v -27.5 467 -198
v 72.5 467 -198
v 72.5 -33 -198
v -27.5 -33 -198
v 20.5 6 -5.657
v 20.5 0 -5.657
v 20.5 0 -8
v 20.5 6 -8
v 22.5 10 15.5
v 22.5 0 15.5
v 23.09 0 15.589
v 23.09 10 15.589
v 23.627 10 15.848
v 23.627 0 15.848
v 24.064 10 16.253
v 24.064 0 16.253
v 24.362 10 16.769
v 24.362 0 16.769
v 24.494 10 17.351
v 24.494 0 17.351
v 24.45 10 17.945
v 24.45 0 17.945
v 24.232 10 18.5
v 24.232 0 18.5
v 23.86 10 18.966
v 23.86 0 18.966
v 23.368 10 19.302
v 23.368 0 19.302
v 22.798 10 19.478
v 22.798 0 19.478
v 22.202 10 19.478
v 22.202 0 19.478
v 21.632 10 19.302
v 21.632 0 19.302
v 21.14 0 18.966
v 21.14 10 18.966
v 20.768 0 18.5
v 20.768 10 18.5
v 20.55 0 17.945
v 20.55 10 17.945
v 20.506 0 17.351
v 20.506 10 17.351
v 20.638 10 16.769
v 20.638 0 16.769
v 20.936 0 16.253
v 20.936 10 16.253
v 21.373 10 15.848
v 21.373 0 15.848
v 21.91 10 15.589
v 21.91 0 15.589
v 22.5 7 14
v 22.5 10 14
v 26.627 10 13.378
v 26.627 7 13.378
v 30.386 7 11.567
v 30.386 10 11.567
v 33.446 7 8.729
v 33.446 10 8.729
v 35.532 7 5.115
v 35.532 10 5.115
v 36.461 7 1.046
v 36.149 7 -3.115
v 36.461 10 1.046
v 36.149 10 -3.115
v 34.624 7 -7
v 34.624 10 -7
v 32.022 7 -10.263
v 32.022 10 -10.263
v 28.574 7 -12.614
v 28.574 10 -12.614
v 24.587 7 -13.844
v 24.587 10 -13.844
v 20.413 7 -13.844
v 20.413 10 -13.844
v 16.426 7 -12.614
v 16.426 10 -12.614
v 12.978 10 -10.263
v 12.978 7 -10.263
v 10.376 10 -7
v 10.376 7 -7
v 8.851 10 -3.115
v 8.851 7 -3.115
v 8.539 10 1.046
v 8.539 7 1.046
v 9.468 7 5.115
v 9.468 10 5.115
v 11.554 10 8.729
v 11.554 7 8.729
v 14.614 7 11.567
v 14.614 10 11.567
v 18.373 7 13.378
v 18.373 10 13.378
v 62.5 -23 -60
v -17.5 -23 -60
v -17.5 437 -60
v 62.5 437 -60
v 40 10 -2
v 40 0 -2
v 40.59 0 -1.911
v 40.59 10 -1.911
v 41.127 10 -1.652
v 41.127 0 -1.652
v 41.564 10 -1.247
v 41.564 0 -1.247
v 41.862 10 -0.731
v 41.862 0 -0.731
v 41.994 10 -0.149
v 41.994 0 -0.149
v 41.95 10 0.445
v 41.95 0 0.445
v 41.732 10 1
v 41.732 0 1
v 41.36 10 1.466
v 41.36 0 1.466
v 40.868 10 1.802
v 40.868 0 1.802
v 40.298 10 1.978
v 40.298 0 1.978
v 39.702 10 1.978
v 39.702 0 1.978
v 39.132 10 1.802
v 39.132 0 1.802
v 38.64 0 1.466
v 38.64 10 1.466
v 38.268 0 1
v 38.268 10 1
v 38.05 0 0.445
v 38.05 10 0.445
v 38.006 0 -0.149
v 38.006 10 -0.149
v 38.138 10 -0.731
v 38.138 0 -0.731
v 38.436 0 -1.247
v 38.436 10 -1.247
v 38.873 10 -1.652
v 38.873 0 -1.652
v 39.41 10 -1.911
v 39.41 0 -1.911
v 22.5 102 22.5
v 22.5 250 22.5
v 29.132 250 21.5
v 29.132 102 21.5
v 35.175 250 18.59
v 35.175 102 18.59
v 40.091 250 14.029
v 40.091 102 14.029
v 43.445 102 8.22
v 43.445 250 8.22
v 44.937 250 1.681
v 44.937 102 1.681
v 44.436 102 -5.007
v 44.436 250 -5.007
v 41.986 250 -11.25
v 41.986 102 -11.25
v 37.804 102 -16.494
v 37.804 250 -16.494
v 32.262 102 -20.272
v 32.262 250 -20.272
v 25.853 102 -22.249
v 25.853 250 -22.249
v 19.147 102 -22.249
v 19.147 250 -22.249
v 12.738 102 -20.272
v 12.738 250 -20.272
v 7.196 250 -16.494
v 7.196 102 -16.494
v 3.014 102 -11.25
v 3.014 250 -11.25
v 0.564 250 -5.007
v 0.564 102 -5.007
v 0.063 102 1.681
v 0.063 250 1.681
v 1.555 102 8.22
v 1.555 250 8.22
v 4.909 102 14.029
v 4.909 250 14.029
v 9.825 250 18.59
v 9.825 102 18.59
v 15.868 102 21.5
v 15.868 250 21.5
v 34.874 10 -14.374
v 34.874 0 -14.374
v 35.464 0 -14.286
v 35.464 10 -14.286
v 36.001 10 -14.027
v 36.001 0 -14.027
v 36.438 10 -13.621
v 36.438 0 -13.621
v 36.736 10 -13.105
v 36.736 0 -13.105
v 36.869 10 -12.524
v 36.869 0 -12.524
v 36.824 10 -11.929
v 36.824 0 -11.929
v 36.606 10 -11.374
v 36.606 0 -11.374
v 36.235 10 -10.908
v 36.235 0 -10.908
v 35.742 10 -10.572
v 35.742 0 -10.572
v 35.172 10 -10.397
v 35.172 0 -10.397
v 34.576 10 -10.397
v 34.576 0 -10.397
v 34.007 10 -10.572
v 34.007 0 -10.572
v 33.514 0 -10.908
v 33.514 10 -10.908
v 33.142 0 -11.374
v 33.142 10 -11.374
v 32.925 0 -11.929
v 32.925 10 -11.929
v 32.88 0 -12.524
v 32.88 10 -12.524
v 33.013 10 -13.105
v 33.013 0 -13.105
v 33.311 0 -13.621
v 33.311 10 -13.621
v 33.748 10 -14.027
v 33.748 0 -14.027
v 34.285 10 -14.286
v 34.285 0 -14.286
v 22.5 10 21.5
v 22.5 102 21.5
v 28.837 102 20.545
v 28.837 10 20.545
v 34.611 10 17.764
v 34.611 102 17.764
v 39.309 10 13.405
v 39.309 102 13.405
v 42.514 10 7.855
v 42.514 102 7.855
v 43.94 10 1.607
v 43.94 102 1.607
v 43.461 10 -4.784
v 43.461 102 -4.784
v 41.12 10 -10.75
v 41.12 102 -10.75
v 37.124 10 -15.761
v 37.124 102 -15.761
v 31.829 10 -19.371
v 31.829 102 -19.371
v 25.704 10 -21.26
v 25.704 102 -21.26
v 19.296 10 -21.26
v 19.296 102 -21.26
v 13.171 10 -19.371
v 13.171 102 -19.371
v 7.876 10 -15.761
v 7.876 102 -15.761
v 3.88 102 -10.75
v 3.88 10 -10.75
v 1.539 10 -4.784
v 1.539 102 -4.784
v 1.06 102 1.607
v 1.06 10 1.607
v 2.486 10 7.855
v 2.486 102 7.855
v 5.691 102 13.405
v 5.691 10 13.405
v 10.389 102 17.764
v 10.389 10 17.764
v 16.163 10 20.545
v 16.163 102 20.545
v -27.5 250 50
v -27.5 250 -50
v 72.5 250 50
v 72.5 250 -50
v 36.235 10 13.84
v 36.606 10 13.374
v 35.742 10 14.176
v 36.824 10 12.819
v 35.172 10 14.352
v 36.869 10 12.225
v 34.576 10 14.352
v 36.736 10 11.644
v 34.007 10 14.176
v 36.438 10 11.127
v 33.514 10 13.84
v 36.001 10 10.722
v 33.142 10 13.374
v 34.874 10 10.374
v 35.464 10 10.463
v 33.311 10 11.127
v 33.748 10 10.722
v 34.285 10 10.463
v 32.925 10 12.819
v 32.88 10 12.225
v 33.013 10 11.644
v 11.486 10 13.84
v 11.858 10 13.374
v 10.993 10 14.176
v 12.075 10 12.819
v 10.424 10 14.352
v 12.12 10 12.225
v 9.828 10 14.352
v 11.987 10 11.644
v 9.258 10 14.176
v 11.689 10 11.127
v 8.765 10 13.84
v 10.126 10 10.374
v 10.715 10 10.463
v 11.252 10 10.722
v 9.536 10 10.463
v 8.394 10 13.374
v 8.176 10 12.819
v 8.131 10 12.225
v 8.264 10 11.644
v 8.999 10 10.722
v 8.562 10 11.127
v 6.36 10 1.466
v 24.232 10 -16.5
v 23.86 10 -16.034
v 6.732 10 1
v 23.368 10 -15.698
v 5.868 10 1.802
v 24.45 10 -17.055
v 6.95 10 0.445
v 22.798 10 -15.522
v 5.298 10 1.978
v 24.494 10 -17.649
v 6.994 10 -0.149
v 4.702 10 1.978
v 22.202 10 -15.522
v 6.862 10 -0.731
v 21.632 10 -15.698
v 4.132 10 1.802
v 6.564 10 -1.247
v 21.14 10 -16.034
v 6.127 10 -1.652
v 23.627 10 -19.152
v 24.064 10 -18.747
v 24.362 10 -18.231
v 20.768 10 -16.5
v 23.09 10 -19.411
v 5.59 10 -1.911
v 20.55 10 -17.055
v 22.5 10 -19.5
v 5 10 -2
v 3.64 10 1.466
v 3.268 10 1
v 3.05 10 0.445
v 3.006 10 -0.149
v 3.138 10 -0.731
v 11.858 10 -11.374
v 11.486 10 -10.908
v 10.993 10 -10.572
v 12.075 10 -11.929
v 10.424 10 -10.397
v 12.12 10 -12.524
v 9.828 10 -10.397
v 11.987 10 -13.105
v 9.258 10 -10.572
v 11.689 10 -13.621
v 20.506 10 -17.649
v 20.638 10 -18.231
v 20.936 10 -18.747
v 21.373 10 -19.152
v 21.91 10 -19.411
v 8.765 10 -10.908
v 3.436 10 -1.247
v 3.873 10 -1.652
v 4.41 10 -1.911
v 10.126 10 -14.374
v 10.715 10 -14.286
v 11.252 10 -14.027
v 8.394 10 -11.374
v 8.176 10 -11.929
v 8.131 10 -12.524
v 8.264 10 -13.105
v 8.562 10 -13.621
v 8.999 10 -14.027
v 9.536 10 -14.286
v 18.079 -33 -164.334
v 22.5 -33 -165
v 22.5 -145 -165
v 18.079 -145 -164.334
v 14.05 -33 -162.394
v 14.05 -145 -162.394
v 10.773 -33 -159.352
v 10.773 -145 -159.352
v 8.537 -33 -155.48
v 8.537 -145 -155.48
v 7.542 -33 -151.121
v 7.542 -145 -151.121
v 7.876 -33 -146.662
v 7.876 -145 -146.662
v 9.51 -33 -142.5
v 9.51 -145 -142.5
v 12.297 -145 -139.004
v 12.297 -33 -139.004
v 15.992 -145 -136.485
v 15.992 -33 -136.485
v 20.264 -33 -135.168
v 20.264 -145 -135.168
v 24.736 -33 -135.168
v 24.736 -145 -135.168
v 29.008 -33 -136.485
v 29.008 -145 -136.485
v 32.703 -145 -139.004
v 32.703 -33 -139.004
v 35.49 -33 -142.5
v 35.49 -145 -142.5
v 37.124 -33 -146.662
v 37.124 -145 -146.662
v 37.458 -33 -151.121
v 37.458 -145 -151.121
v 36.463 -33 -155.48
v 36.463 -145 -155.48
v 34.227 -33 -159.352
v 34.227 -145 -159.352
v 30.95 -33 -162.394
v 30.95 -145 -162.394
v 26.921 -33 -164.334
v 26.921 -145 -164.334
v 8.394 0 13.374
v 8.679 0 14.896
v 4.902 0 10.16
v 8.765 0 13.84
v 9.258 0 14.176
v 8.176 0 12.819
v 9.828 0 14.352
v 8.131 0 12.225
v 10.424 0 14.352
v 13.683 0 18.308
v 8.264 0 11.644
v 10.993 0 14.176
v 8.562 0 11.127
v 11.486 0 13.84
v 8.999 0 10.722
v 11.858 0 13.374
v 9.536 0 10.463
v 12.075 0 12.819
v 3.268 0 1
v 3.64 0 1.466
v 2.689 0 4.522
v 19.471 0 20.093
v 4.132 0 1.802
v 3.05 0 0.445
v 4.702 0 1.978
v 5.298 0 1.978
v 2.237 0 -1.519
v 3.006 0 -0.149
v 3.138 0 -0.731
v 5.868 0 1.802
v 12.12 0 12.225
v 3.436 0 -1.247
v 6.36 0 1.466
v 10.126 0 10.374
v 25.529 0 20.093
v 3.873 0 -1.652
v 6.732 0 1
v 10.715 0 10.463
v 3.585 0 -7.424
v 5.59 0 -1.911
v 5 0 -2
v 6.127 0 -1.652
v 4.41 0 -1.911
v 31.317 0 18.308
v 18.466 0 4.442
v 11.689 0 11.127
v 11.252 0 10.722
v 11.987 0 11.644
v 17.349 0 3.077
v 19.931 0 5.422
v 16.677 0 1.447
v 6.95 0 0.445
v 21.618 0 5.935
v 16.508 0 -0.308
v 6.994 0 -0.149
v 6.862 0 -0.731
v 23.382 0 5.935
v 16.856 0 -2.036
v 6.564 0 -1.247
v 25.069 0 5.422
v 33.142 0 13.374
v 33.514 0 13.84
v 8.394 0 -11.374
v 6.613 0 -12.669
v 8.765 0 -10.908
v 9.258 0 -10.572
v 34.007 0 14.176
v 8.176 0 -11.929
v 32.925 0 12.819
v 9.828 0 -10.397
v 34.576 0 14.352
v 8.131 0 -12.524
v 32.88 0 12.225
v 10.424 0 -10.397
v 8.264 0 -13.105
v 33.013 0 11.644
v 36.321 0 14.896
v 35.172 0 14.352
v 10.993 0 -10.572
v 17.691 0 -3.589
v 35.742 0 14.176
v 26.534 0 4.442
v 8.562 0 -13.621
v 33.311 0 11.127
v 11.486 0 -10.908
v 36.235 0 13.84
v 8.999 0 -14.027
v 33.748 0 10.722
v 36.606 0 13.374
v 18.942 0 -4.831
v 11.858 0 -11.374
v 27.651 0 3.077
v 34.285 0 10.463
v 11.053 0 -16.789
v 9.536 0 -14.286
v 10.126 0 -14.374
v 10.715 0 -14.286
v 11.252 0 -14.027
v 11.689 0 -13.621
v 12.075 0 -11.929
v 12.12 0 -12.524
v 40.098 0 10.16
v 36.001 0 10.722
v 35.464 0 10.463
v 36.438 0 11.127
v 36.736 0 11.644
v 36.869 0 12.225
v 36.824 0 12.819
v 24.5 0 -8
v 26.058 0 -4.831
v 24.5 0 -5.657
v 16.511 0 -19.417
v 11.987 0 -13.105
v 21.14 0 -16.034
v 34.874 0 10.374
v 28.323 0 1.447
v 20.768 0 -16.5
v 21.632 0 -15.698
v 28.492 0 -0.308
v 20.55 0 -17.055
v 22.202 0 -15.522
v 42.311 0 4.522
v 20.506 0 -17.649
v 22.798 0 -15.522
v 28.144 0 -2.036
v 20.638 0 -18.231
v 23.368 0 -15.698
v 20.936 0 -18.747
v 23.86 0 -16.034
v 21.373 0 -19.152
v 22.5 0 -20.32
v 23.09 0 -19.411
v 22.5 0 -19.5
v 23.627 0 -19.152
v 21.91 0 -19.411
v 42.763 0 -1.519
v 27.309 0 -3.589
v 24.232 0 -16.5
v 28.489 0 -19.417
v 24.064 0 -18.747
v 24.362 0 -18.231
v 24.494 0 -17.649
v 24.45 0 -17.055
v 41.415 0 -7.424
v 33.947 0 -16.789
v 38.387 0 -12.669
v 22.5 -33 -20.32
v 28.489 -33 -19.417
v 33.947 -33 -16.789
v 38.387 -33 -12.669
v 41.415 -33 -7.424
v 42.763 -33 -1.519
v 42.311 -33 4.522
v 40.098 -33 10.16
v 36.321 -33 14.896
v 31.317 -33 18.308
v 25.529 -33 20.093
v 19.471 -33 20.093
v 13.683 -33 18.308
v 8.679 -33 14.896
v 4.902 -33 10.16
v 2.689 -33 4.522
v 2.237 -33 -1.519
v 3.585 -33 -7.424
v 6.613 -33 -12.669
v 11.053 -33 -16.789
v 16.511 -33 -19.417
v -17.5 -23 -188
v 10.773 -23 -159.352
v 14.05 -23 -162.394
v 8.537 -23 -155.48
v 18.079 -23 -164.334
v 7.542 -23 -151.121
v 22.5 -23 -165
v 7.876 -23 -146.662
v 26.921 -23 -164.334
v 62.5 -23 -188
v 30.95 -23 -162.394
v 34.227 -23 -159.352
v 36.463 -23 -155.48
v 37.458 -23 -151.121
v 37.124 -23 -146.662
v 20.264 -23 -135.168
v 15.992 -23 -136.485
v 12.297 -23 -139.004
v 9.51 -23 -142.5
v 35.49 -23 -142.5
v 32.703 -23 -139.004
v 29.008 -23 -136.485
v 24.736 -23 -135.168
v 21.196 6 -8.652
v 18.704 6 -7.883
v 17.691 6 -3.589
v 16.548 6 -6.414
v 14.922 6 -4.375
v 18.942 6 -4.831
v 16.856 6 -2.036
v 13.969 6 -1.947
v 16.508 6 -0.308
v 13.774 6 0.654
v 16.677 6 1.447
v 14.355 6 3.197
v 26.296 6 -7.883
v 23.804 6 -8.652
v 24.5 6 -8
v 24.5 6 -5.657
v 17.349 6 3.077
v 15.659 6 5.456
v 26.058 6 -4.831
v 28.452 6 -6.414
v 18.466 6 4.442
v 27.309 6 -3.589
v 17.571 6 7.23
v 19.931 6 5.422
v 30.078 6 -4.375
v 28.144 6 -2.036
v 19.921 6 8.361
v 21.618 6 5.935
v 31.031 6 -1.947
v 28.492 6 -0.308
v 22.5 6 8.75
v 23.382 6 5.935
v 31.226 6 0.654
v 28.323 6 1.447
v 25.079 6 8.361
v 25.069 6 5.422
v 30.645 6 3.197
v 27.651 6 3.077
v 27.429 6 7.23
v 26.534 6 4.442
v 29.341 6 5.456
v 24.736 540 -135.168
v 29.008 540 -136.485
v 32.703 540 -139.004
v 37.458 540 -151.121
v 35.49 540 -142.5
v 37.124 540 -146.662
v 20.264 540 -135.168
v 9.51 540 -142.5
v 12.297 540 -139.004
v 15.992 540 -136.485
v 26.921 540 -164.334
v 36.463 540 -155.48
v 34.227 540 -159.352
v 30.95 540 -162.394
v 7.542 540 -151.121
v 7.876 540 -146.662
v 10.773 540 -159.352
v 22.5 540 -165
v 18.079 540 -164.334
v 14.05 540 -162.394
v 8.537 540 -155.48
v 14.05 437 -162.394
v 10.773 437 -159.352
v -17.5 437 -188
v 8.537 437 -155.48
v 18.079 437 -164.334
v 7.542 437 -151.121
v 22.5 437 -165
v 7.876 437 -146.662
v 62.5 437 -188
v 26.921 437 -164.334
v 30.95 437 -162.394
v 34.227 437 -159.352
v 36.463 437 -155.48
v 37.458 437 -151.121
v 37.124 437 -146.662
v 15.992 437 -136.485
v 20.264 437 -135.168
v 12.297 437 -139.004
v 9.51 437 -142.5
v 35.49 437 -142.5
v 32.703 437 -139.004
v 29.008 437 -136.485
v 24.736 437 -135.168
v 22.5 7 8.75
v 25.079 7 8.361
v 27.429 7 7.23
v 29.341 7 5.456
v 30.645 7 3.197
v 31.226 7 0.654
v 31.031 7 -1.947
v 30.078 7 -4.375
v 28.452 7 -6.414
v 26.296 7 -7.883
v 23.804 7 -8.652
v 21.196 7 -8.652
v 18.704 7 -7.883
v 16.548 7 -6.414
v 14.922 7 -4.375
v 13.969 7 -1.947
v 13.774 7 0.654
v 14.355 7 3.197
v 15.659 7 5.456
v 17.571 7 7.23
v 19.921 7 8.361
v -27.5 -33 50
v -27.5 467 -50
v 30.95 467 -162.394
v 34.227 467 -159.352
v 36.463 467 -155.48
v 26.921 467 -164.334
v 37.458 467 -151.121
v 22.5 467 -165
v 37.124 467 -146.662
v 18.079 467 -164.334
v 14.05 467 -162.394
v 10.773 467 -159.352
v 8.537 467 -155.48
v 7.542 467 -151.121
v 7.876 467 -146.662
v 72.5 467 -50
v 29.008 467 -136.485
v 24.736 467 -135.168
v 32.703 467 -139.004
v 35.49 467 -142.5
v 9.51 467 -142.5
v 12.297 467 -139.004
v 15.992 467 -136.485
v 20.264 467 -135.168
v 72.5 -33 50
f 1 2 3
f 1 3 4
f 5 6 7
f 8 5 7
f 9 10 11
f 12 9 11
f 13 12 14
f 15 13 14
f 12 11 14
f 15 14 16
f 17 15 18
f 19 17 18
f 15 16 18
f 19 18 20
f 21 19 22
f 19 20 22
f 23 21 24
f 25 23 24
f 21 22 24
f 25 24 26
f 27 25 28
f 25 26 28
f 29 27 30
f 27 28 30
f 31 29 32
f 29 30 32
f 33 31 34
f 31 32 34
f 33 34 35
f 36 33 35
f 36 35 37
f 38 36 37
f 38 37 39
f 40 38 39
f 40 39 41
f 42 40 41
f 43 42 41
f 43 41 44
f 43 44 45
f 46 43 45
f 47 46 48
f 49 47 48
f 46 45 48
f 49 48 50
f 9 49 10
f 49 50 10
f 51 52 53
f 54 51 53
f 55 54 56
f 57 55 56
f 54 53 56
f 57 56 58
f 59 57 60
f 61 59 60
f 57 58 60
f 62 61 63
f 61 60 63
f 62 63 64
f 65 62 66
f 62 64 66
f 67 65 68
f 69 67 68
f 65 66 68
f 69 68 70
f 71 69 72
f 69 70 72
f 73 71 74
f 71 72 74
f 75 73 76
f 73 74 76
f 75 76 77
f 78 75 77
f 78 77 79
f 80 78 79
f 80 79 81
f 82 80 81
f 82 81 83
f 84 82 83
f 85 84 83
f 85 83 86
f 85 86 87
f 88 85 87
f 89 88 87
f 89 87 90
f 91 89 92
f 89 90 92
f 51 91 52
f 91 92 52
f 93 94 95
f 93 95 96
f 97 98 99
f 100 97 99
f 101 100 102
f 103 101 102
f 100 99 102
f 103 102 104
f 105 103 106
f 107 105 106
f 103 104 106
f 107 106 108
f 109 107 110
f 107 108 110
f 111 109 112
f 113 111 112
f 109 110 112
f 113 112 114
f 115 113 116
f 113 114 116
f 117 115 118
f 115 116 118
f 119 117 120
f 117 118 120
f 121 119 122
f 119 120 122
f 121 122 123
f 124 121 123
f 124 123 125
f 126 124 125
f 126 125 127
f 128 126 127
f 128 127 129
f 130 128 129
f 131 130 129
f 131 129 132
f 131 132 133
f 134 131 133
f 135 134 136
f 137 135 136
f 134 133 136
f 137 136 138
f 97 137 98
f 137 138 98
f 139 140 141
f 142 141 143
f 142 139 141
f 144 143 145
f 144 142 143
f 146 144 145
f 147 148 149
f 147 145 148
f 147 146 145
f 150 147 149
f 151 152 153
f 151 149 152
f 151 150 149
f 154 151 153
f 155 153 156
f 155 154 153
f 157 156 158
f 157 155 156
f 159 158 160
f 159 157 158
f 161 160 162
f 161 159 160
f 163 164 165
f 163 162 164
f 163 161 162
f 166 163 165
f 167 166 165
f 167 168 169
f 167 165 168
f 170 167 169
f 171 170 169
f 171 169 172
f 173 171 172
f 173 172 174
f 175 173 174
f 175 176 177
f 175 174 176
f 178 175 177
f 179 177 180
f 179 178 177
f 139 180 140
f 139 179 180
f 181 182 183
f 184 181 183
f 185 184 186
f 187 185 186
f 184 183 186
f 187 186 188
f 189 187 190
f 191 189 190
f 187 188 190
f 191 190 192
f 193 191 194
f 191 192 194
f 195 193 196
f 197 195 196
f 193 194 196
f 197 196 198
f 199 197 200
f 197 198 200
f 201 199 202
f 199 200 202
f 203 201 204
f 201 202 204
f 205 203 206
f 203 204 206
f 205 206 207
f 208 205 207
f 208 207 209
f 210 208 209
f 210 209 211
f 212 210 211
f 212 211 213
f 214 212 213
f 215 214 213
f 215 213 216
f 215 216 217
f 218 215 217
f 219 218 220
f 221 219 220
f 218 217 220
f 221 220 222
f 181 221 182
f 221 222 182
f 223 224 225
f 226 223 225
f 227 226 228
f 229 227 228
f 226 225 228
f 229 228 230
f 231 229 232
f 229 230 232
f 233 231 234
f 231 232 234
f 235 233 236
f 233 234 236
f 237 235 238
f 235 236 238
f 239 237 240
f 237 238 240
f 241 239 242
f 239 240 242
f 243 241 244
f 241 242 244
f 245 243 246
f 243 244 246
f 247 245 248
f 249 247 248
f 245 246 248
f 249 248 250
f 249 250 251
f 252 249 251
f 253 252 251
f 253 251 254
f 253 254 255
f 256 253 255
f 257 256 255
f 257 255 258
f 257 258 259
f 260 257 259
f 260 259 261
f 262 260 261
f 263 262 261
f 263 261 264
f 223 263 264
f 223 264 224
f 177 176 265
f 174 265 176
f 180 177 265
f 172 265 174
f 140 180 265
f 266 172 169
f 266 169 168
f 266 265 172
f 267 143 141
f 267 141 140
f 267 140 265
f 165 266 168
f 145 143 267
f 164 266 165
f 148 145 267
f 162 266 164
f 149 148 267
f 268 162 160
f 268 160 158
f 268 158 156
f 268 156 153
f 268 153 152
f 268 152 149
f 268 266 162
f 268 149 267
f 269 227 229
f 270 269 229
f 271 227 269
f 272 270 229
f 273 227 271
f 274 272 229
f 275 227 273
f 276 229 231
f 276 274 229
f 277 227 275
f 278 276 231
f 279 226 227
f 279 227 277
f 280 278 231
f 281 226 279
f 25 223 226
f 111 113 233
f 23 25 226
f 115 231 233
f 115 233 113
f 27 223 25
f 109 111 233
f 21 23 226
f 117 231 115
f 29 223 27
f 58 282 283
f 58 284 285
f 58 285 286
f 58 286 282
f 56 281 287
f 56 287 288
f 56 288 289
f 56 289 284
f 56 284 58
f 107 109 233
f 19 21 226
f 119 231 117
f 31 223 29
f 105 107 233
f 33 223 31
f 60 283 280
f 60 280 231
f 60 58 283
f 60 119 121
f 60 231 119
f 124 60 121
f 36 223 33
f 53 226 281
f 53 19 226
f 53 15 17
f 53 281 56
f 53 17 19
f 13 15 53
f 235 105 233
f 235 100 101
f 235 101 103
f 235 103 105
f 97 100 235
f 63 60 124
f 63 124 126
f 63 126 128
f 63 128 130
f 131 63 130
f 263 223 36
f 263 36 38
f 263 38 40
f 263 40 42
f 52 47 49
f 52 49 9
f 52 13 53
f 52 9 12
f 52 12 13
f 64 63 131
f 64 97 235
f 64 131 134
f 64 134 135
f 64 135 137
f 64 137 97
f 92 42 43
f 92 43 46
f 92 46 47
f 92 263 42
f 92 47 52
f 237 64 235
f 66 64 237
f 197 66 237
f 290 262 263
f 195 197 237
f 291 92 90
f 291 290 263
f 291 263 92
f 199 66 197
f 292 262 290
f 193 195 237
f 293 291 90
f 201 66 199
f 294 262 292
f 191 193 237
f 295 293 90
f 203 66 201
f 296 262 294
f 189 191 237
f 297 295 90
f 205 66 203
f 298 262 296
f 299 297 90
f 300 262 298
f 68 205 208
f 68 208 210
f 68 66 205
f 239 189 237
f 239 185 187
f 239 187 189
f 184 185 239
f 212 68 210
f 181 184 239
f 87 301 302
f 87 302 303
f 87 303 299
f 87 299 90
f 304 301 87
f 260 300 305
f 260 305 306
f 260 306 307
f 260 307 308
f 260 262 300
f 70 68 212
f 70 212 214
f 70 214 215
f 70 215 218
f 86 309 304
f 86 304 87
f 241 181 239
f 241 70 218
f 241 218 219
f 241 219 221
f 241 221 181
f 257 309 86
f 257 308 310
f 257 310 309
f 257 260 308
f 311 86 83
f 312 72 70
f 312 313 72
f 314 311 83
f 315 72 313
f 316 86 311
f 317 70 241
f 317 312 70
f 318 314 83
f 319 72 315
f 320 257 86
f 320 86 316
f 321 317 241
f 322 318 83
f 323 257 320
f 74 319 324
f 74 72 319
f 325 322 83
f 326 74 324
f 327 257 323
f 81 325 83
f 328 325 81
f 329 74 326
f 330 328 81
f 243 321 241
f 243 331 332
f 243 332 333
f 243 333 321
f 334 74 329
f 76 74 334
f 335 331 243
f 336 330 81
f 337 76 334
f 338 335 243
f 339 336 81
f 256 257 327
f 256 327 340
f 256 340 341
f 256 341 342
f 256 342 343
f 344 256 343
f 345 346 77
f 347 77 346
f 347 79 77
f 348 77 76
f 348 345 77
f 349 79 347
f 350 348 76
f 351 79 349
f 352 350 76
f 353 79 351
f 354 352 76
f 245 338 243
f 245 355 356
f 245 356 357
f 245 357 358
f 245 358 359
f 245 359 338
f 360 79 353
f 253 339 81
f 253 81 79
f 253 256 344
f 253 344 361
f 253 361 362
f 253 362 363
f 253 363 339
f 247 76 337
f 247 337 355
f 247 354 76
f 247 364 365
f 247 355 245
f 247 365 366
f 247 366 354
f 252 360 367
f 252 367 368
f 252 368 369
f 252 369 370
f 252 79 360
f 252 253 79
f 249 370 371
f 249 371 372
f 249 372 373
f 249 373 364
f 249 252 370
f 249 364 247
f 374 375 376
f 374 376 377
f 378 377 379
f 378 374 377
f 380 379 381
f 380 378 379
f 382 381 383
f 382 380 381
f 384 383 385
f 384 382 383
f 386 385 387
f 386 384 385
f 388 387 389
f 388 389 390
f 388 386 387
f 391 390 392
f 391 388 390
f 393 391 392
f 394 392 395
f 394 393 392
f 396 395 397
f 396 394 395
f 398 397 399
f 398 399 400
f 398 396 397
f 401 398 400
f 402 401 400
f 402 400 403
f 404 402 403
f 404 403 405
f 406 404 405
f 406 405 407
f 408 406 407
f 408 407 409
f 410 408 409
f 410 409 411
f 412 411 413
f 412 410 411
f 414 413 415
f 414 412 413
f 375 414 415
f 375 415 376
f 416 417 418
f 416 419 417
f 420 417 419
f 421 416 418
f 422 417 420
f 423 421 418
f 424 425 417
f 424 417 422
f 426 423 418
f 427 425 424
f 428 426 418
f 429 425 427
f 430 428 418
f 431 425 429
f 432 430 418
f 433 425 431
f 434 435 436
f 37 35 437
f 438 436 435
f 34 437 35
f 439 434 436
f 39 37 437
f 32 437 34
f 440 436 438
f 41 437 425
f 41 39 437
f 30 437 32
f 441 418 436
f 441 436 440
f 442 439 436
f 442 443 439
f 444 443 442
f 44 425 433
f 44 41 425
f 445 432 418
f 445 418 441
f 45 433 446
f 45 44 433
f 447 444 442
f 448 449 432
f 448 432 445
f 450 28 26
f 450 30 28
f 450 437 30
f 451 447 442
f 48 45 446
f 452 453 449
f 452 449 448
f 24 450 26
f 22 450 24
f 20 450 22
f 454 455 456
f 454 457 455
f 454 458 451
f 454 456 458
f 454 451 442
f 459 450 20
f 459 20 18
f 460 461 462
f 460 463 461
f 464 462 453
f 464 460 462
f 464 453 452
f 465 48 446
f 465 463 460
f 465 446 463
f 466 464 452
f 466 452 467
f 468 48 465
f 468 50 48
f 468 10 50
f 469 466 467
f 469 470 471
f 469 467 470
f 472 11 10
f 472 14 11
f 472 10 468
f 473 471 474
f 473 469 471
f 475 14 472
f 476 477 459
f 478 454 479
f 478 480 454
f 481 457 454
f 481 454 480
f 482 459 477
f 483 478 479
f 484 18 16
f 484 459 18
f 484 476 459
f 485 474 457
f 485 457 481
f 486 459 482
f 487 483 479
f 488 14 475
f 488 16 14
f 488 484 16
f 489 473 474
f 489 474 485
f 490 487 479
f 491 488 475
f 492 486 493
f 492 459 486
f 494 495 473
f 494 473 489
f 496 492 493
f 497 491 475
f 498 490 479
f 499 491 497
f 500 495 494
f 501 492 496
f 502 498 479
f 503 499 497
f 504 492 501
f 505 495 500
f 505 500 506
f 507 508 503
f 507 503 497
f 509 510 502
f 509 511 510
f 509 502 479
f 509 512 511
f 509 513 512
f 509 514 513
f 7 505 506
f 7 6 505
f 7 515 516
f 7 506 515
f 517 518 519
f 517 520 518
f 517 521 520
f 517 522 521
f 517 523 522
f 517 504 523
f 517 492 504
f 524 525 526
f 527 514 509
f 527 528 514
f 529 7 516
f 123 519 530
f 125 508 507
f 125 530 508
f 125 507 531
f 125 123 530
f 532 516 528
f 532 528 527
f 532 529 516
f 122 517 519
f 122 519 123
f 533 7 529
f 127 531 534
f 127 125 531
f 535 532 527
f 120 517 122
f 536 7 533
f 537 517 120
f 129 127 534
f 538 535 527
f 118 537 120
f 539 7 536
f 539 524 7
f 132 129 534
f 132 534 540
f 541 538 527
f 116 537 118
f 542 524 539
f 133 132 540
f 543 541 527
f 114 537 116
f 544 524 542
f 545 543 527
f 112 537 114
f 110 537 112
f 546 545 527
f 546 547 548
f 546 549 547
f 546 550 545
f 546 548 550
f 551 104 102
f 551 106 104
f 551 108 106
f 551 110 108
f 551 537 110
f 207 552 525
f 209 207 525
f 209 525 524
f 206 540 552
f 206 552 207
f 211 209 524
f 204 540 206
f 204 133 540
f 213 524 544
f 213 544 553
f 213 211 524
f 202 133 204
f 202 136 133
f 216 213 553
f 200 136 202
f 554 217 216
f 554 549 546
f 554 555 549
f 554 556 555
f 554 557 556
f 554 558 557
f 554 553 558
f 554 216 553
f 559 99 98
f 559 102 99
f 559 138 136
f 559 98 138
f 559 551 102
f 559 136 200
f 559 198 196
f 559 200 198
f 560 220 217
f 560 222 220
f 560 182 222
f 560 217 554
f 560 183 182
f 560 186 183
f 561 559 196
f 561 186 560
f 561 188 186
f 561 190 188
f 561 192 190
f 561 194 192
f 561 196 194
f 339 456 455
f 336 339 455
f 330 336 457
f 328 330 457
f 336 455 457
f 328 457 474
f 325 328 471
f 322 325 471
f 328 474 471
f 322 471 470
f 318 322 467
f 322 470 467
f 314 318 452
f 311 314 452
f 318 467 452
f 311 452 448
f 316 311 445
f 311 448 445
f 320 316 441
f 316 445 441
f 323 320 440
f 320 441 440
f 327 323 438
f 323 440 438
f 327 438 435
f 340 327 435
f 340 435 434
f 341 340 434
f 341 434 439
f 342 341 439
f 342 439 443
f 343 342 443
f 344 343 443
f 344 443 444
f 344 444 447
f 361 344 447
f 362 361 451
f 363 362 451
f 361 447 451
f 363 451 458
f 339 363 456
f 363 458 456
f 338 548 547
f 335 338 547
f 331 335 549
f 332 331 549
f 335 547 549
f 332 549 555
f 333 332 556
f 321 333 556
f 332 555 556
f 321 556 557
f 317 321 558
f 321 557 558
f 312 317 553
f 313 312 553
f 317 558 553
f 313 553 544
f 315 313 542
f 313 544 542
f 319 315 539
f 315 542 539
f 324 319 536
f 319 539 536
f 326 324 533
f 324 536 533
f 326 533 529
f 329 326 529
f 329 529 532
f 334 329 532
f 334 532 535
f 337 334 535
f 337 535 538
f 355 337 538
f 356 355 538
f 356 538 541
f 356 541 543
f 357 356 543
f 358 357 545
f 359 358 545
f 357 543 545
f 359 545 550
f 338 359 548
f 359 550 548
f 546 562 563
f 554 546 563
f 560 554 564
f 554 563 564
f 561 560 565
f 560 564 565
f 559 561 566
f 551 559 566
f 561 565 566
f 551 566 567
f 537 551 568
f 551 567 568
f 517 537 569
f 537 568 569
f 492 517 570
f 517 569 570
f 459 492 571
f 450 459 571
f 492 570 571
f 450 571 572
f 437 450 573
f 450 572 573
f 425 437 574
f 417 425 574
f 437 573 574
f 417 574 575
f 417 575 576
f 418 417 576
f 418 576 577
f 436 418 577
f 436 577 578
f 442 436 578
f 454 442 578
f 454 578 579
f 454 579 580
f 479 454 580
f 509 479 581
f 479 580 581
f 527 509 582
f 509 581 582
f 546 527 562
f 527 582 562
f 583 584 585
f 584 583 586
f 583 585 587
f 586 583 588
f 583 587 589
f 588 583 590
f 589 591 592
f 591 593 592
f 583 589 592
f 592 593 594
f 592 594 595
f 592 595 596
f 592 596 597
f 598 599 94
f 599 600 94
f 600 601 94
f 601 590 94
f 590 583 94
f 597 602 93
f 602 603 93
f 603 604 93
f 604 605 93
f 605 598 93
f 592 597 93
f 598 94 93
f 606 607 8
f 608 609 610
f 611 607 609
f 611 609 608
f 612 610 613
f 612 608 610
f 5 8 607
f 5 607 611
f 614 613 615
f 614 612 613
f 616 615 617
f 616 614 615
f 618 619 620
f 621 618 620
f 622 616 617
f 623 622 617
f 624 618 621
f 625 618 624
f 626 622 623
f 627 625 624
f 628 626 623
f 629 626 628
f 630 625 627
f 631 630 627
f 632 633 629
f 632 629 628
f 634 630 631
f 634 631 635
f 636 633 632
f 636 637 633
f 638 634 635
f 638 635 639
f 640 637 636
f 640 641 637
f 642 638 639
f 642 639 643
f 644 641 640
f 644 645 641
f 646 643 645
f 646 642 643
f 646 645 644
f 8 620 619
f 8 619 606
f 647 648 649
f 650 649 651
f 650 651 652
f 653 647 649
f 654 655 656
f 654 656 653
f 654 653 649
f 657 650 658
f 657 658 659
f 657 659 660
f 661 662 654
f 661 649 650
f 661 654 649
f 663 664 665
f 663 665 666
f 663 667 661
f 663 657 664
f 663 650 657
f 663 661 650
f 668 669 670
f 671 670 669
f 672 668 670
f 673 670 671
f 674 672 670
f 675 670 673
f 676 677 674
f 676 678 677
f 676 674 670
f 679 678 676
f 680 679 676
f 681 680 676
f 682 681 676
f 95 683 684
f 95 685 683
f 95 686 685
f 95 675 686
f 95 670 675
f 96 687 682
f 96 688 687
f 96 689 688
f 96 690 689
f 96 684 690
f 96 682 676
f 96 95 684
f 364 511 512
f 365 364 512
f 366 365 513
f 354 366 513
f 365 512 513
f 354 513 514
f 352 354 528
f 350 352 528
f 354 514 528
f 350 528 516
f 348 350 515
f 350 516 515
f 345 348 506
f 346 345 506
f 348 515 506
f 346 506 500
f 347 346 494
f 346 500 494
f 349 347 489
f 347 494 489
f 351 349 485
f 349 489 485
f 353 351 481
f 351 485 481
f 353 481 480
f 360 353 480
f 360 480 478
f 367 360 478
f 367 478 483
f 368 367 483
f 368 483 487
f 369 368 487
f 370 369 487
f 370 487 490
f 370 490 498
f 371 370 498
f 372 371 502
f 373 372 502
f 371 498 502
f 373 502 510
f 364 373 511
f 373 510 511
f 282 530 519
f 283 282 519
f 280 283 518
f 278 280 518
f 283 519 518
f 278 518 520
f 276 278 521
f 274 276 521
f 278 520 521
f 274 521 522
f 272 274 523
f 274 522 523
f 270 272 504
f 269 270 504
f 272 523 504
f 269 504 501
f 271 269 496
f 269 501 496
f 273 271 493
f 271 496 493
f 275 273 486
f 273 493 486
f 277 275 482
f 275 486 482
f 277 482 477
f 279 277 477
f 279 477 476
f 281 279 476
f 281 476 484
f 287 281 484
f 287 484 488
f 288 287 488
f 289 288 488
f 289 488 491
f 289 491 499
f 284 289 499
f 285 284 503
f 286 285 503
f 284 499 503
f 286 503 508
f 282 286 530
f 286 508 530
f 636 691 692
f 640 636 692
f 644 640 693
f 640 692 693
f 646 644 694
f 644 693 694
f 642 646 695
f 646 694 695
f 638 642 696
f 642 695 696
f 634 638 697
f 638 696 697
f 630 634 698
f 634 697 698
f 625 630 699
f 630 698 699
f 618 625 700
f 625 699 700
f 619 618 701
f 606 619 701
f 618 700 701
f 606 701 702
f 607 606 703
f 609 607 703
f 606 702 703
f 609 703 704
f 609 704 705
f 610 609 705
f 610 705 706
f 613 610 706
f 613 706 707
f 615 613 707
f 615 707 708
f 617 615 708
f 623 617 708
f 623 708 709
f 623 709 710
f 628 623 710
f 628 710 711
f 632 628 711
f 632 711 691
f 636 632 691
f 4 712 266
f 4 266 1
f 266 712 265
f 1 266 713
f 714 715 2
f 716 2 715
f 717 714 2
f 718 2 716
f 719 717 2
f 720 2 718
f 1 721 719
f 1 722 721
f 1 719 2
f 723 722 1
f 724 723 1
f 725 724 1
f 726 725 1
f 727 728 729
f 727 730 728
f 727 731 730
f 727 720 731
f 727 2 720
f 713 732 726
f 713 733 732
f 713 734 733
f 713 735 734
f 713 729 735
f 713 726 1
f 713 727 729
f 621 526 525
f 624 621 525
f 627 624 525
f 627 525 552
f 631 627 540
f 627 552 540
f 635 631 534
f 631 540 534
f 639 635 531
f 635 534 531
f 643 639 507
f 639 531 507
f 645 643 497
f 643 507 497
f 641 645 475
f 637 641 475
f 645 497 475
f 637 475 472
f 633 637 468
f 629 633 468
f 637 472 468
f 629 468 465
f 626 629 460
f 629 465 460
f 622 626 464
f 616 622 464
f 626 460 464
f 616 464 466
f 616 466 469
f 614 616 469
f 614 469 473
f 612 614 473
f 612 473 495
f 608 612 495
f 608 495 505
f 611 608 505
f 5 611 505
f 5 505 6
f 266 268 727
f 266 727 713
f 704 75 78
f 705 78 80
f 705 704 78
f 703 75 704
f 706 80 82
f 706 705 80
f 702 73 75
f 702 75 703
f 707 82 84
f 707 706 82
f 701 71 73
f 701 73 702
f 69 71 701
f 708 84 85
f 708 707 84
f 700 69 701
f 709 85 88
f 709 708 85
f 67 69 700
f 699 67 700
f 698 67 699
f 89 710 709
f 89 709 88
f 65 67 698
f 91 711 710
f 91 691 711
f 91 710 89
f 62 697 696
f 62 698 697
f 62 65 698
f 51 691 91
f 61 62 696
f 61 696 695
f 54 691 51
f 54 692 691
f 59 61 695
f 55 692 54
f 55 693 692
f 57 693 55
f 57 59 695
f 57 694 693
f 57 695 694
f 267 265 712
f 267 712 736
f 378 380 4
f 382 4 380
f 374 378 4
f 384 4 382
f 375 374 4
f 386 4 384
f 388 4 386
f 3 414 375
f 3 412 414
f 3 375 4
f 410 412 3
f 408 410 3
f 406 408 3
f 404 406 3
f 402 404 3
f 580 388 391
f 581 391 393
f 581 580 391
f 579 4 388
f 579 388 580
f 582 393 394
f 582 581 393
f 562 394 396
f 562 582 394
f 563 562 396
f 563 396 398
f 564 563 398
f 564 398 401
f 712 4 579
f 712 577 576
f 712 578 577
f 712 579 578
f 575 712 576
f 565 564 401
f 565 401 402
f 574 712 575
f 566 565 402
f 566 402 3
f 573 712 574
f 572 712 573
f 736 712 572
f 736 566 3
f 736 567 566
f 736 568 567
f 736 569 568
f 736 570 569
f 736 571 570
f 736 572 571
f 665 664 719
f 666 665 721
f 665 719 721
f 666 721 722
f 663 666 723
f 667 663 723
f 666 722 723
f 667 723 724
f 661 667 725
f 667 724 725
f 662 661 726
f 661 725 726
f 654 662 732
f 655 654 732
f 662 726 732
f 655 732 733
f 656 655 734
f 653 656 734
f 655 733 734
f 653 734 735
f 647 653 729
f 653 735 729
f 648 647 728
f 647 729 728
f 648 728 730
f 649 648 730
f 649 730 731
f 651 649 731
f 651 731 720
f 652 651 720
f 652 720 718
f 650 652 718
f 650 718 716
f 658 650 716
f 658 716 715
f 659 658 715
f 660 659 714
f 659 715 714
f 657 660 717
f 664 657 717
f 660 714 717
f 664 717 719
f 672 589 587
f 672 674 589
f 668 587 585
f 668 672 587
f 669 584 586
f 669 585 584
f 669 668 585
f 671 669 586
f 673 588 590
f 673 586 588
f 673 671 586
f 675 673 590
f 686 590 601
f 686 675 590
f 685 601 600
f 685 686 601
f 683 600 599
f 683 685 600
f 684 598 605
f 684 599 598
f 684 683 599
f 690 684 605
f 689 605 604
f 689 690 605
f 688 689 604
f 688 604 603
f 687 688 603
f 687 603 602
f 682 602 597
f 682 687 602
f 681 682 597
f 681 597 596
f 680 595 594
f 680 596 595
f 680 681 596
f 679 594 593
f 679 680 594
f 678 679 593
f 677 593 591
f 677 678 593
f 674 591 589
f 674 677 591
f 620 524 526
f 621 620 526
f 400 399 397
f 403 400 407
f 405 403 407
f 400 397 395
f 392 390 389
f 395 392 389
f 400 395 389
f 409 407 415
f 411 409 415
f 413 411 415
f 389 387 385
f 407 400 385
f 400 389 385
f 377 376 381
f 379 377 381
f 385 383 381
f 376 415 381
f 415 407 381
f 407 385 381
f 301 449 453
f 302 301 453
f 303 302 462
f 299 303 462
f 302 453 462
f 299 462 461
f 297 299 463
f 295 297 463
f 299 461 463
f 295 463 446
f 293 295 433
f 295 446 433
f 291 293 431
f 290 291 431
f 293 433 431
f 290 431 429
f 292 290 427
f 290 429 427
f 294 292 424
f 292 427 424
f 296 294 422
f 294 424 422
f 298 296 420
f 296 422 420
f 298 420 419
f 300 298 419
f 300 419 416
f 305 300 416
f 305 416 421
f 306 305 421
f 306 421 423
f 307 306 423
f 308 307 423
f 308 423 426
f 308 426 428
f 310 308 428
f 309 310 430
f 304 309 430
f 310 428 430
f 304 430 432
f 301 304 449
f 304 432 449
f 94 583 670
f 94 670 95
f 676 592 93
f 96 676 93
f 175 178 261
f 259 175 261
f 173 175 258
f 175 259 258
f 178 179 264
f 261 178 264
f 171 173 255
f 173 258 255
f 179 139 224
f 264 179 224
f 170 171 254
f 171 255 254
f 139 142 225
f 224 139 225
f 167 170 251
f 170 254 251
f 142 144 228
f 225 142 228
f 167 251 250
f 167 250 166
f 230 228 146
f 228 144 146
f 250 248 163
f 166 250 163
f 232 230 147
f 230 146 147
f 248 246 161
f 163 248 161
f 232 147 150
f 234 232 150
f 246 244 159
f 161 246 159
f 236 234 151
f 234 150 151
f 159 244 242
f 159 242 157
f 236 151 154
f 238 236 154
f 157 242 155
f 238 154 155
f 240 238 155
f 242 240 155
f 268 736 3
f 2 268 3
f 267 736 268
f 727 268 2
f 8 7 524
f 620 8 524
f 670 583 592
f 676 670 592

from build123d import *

# Parameters (mm, degrees)
EXTRUDE_START         = -250
SKETCH_3_R            = 50
SKETCH_3_R_2          = 32.5
EXTRUDE_1_DEPTH       = 250
EXTRUDE_7_DEPTH       = 250
EXTRUDE_8_DEPTH       = 50
EXTRUDE_8_DEPTH_BACK  = 50
SKETCH_12_W           = 100
SKETCH_12_H           = 500
EXTRUDE_10_DEPTH      = 148
EXTRUDE_12_DEPTH      = 73
EXTRUDE_12_DEPTH_BACK = 612
SKETCH_13_R           = 15
SKETCH_20_W           = 80
SKETCH_20_H           = 128
SKETCH_20_R           = 15
CUT_EXTRUDE_4_DEPTH   = 470
SKETCH_20_4_W         = 80
SKETCH_20_4_H         = 128
SKETCH_20_4_R         = 15
EXTRUDE_13_DEPTH      = 10
SKETCH_1_22_W         = 6
SKETCH_1_22_H         = 10
SKETCH_22_R           = 20.32
CUT_EXTRUDE_6_DEPTH   = 33
SKETCH_23_R           = 2
CUT_EXTRUDE_7_DEPTH   = 10
SKETCH_25_R           = 14
CUT_EXTRUDE_8_DEPTH   = 3
SKETCH_26_R           = 8.75
CUT_EXTRUDE_9_DEPTH   = 4
SKETCH_27_R           = 6
CUT_EXTRUDE_10_DEPTH  = 6
CUT_EXTRUDE_12_DEPTH  = 6


with BuildPart() as part:
    # 草图1 → 旋转1 (revolve)
    with BuildSketch(Plane.XY):
        Polygon((16.5, 10), (1, 10), (1, 102), (0, 102), (0, 250), (-10, 250), (-10, 0), (16.5, 0), align=None)
        Polygon((28.5, 10), (28.5, 0), (55, 0), (55, 250), (45, 250), (45, 102), (44, 102), (44, 10), align=None)
    revolve(axis=Axis((22.5, 0, 0), (0, 1, 0)))

    # 草图3 → 凸台-拉伸1 (add)
    with BuildSketch(Plane(origin=(0, 250, 0), x_dir=(1, 0, 0), z_dir=(0, 1, 0)).offset(EXTRUDE_START)):
        with Locations((22.5, 0)):
            Circle(SKETCH_3_R)
        with Locations((22.5, 0)):
            Circle(SKETCH_3_R_2, mode=Mode.SUBTRACT)
    extrude(amount=EXTRUDE_1_DEPTH)

    # 草图3<5> → 凸台-拉伸7 (add)
    with BuildSketch(Plane(origin=(0, 250, 0), x_dir=(1, 0, 0), z_dir=(0, 1, 0)).offset(EXTRUDE_START)):
        with BuildLine():
            ThreePointArc((22.5, -50), (-12.855339059, -35.355339059), (-27.5, 0))
            Line((-27.5, 0), (-27.5, -50))
            Line((-27.5, -50), (22.5, -50))
        make_face()
        with BuildLine():
            Line((-27.5, 50), (-27.5, 0))
            ThreePointArc((-27.5, 0), (-12.855339059, 35.355339059), (22.5, 50))
            Line((22.5, 50), (-27.5, 50))
        make_face()
        with BuildLine():
            Line((72.5, 50), (22.5, 50))
            ThreePointArc((22.5, 50), (57.855339059, 35.355339059), (72.5, 0))
            Line((72.5, 0), (72.5, 50))
        make_face()
        with BuildLine():
            ThreePointArc((72.5, 0), (57.855339059, -35.355339059), (22.5, -50))
            Line((22.5, -50), (72.5, -50))
            Line((72.5, -50), (72.5, 0))
        make_face()
    extrude(amount=EXTRUDE_7_DEPTH)

    # 草图1<21> → 凸台-拉伸8 (add, two sides: drawn at the far end of the back side and taken through both)
    with BuildSketch(Plane.XY.offset(-EXTRUDE_8_DEPTH_BACK)):
        Polygon((16.5, 0), (0, 0), (-10, 0), (-27.5, 0), (-27.5, -33), (72.5, -33), (72.5, 0), (55, 0), (45, 0), (28.5, 0), align=None)
    extrude(amount=EXTRUDE_8_DEPTH + EXTRUDE_8_DEPTH_BACK)

    # 草图12 → 凸台-拉伸10 (add)
    with BuildSketch(Plane(origin=(0, 0, -50), x_dir=(-1, 0, 0), z_dir=(0, 0, -1))):
        with Locations((-22.5, 217)):
            Rectangle(SKETCH_12_W, SKETCH_12_H)
    extrude(amount=EXTRUDE_10_DEPTH)

    # 草图13 → 凸台-拉伸12 (add, two sides: drawn at the far end of the back side and taken through both)
    with BuildSketch(Plane(origin=(0, 467, 0), x_dir=(1, 0, 0), z_dir=(0, 1, 0)).offset(-EXTRUDE_12_DEPTH_BACK)):
        with Locations((22.5, 150)):
            Circle(SKETCH_13_R)
    extrude(amount=EXTRUDE_12_DEPTH + EXTRUDE_12_DEPTH_BACK)

    # 草图20 → 切除-拉伸4 (cut)
    with BuildSketch(Plane.XZ.offset(33)):
        with Locations((22.5, -124)):
            Rectangle(SKETCH_20_W, SKETCH_20_H)
        with Locations((22.5, -150)):
            Circle(SKETCH_20_R, mode=Mode.SUBTRACT)
    extrude(amount=-CUT_EXTRUDE_4_DEPTH, mode=Mode.SUBTRACT)

    # 草图20<4> → 凸台-拉伸13 (add)
    with BuildSketch(Plane.XZ.offset(33)):
        with Locations((22.5, -124)):
            Rectangle(SKETCH_20_4_W, SKETCH_20_4_H)
        with Locations((22.5, -150)):
            Circle(SKETCH_20_4_R, mode=Mode.SUBTRACT)
    extrude(amount=-EXTRUDE_13_DEPTH)

    # 草图1<22> → 旋转2 (revolve)
    with BuildSketch(Plane.XY):
        with Locations((19.5, 5)):
            Rectangle(SKETCH_1_22_W, SKETCH_1_22_H)
    revolve(axis=Axis((22.5, 0, 0), (0, 1, 0)))

    # 草图22 → 切除-拉伸6 (cut)
    with BuildSketch(Plane.XZ.offset(33)):
        with Locations((22.5, 0)):
            Circle(SKETCH_22_R)
    extrude(amount=-CUT_EXTRUDE_6_DEPTH, mode=Mode.SUBTRACT)

    # 草图23 → 切除-拉伸7 (cut)
    with BuildSketch(Plane.XZ):
        with Locations((22.5, 17.5)):
            Circle(SKETCH_23_R)
        with Locations((34.874368671, 12.374368671)):
            Circle(SKETCH_23_R)
        with Locations((40, 0)):
            Circle(SKETCH_23_R)
        with Locations((34.874368671, -12.374368671)):
            Circle(SKETCH_23_R)
        with Locations((22.5, -17.5)):
            Circle(SKETCH_23_R)
        with Locations((10.125631329, -12.374368671)):
            Circle(SKETCH_23_R)
        with Locations((5, 0)):
            Circle(SKETCH_23_R)
        with Locations((10.125631329, 12.374368671)):
            Circle(SKETCH_23_R)
    extrude(amount=-CUT_EXTRUDE_7_DEPTH, mode=Mode.SUBTRACT)

    # 草图25 → 切除-拉伸8 (cut)
    with BuildSketch(Plane(origin=(0, 10, 0), x_dir=(1, 0, 0), z_dir=(0, 1, 0))):
        with Locations((22.5, 0)):
            Circle(SKETCH_25_R)
    extrude(amount=-CUT_EXTRUDE_8_DEPTH, mode=Mode.SUBTRACT)

    # 草图26 → 切除-拉伸9 (cut)
    with BuildSketch(Plane(origin=(0, 10, 0), x_dir=(1, 0, 0), z_dir=(0, 1, 0))):
        with Locations((22.5, 0)):
            Circle(SKETCH_26_R)
    extrude(amount=-CUT_EXTRUDE_9_DEPTH, mode=Mode.SUBTRACT)

    # 草图27 → 切除-拉伸10 (cut)
    with BuildSketch(Plane.XZ):
        with Locations((22.5, 0)):
            Circle(SKETCH_27_R)
    extrude(amount=-CUT_EXTRUDE_10_DEPTH, mode=Mode.SUBTRACT)

    # 草图27<5> → 切除-拉伸12 (cut)
    with BuildSketch(Plane.XZ):
        with BuildLine():
            Line((20.5, -8), (24.5, -8))
            Line((24.5, -8), (24.5, -5.656854249))
            ThreePointArc((24.5, -5.656854249), (22.5, -6), (20.5, -5.656854249))
            Line((20.5, -5.656854249), (20.5, -8))
        make_face()
    extrude(amount=-CUT_EXTRUDE_12_DEPTH, mode=Mode.SUBTRACT)


solid = part.part
